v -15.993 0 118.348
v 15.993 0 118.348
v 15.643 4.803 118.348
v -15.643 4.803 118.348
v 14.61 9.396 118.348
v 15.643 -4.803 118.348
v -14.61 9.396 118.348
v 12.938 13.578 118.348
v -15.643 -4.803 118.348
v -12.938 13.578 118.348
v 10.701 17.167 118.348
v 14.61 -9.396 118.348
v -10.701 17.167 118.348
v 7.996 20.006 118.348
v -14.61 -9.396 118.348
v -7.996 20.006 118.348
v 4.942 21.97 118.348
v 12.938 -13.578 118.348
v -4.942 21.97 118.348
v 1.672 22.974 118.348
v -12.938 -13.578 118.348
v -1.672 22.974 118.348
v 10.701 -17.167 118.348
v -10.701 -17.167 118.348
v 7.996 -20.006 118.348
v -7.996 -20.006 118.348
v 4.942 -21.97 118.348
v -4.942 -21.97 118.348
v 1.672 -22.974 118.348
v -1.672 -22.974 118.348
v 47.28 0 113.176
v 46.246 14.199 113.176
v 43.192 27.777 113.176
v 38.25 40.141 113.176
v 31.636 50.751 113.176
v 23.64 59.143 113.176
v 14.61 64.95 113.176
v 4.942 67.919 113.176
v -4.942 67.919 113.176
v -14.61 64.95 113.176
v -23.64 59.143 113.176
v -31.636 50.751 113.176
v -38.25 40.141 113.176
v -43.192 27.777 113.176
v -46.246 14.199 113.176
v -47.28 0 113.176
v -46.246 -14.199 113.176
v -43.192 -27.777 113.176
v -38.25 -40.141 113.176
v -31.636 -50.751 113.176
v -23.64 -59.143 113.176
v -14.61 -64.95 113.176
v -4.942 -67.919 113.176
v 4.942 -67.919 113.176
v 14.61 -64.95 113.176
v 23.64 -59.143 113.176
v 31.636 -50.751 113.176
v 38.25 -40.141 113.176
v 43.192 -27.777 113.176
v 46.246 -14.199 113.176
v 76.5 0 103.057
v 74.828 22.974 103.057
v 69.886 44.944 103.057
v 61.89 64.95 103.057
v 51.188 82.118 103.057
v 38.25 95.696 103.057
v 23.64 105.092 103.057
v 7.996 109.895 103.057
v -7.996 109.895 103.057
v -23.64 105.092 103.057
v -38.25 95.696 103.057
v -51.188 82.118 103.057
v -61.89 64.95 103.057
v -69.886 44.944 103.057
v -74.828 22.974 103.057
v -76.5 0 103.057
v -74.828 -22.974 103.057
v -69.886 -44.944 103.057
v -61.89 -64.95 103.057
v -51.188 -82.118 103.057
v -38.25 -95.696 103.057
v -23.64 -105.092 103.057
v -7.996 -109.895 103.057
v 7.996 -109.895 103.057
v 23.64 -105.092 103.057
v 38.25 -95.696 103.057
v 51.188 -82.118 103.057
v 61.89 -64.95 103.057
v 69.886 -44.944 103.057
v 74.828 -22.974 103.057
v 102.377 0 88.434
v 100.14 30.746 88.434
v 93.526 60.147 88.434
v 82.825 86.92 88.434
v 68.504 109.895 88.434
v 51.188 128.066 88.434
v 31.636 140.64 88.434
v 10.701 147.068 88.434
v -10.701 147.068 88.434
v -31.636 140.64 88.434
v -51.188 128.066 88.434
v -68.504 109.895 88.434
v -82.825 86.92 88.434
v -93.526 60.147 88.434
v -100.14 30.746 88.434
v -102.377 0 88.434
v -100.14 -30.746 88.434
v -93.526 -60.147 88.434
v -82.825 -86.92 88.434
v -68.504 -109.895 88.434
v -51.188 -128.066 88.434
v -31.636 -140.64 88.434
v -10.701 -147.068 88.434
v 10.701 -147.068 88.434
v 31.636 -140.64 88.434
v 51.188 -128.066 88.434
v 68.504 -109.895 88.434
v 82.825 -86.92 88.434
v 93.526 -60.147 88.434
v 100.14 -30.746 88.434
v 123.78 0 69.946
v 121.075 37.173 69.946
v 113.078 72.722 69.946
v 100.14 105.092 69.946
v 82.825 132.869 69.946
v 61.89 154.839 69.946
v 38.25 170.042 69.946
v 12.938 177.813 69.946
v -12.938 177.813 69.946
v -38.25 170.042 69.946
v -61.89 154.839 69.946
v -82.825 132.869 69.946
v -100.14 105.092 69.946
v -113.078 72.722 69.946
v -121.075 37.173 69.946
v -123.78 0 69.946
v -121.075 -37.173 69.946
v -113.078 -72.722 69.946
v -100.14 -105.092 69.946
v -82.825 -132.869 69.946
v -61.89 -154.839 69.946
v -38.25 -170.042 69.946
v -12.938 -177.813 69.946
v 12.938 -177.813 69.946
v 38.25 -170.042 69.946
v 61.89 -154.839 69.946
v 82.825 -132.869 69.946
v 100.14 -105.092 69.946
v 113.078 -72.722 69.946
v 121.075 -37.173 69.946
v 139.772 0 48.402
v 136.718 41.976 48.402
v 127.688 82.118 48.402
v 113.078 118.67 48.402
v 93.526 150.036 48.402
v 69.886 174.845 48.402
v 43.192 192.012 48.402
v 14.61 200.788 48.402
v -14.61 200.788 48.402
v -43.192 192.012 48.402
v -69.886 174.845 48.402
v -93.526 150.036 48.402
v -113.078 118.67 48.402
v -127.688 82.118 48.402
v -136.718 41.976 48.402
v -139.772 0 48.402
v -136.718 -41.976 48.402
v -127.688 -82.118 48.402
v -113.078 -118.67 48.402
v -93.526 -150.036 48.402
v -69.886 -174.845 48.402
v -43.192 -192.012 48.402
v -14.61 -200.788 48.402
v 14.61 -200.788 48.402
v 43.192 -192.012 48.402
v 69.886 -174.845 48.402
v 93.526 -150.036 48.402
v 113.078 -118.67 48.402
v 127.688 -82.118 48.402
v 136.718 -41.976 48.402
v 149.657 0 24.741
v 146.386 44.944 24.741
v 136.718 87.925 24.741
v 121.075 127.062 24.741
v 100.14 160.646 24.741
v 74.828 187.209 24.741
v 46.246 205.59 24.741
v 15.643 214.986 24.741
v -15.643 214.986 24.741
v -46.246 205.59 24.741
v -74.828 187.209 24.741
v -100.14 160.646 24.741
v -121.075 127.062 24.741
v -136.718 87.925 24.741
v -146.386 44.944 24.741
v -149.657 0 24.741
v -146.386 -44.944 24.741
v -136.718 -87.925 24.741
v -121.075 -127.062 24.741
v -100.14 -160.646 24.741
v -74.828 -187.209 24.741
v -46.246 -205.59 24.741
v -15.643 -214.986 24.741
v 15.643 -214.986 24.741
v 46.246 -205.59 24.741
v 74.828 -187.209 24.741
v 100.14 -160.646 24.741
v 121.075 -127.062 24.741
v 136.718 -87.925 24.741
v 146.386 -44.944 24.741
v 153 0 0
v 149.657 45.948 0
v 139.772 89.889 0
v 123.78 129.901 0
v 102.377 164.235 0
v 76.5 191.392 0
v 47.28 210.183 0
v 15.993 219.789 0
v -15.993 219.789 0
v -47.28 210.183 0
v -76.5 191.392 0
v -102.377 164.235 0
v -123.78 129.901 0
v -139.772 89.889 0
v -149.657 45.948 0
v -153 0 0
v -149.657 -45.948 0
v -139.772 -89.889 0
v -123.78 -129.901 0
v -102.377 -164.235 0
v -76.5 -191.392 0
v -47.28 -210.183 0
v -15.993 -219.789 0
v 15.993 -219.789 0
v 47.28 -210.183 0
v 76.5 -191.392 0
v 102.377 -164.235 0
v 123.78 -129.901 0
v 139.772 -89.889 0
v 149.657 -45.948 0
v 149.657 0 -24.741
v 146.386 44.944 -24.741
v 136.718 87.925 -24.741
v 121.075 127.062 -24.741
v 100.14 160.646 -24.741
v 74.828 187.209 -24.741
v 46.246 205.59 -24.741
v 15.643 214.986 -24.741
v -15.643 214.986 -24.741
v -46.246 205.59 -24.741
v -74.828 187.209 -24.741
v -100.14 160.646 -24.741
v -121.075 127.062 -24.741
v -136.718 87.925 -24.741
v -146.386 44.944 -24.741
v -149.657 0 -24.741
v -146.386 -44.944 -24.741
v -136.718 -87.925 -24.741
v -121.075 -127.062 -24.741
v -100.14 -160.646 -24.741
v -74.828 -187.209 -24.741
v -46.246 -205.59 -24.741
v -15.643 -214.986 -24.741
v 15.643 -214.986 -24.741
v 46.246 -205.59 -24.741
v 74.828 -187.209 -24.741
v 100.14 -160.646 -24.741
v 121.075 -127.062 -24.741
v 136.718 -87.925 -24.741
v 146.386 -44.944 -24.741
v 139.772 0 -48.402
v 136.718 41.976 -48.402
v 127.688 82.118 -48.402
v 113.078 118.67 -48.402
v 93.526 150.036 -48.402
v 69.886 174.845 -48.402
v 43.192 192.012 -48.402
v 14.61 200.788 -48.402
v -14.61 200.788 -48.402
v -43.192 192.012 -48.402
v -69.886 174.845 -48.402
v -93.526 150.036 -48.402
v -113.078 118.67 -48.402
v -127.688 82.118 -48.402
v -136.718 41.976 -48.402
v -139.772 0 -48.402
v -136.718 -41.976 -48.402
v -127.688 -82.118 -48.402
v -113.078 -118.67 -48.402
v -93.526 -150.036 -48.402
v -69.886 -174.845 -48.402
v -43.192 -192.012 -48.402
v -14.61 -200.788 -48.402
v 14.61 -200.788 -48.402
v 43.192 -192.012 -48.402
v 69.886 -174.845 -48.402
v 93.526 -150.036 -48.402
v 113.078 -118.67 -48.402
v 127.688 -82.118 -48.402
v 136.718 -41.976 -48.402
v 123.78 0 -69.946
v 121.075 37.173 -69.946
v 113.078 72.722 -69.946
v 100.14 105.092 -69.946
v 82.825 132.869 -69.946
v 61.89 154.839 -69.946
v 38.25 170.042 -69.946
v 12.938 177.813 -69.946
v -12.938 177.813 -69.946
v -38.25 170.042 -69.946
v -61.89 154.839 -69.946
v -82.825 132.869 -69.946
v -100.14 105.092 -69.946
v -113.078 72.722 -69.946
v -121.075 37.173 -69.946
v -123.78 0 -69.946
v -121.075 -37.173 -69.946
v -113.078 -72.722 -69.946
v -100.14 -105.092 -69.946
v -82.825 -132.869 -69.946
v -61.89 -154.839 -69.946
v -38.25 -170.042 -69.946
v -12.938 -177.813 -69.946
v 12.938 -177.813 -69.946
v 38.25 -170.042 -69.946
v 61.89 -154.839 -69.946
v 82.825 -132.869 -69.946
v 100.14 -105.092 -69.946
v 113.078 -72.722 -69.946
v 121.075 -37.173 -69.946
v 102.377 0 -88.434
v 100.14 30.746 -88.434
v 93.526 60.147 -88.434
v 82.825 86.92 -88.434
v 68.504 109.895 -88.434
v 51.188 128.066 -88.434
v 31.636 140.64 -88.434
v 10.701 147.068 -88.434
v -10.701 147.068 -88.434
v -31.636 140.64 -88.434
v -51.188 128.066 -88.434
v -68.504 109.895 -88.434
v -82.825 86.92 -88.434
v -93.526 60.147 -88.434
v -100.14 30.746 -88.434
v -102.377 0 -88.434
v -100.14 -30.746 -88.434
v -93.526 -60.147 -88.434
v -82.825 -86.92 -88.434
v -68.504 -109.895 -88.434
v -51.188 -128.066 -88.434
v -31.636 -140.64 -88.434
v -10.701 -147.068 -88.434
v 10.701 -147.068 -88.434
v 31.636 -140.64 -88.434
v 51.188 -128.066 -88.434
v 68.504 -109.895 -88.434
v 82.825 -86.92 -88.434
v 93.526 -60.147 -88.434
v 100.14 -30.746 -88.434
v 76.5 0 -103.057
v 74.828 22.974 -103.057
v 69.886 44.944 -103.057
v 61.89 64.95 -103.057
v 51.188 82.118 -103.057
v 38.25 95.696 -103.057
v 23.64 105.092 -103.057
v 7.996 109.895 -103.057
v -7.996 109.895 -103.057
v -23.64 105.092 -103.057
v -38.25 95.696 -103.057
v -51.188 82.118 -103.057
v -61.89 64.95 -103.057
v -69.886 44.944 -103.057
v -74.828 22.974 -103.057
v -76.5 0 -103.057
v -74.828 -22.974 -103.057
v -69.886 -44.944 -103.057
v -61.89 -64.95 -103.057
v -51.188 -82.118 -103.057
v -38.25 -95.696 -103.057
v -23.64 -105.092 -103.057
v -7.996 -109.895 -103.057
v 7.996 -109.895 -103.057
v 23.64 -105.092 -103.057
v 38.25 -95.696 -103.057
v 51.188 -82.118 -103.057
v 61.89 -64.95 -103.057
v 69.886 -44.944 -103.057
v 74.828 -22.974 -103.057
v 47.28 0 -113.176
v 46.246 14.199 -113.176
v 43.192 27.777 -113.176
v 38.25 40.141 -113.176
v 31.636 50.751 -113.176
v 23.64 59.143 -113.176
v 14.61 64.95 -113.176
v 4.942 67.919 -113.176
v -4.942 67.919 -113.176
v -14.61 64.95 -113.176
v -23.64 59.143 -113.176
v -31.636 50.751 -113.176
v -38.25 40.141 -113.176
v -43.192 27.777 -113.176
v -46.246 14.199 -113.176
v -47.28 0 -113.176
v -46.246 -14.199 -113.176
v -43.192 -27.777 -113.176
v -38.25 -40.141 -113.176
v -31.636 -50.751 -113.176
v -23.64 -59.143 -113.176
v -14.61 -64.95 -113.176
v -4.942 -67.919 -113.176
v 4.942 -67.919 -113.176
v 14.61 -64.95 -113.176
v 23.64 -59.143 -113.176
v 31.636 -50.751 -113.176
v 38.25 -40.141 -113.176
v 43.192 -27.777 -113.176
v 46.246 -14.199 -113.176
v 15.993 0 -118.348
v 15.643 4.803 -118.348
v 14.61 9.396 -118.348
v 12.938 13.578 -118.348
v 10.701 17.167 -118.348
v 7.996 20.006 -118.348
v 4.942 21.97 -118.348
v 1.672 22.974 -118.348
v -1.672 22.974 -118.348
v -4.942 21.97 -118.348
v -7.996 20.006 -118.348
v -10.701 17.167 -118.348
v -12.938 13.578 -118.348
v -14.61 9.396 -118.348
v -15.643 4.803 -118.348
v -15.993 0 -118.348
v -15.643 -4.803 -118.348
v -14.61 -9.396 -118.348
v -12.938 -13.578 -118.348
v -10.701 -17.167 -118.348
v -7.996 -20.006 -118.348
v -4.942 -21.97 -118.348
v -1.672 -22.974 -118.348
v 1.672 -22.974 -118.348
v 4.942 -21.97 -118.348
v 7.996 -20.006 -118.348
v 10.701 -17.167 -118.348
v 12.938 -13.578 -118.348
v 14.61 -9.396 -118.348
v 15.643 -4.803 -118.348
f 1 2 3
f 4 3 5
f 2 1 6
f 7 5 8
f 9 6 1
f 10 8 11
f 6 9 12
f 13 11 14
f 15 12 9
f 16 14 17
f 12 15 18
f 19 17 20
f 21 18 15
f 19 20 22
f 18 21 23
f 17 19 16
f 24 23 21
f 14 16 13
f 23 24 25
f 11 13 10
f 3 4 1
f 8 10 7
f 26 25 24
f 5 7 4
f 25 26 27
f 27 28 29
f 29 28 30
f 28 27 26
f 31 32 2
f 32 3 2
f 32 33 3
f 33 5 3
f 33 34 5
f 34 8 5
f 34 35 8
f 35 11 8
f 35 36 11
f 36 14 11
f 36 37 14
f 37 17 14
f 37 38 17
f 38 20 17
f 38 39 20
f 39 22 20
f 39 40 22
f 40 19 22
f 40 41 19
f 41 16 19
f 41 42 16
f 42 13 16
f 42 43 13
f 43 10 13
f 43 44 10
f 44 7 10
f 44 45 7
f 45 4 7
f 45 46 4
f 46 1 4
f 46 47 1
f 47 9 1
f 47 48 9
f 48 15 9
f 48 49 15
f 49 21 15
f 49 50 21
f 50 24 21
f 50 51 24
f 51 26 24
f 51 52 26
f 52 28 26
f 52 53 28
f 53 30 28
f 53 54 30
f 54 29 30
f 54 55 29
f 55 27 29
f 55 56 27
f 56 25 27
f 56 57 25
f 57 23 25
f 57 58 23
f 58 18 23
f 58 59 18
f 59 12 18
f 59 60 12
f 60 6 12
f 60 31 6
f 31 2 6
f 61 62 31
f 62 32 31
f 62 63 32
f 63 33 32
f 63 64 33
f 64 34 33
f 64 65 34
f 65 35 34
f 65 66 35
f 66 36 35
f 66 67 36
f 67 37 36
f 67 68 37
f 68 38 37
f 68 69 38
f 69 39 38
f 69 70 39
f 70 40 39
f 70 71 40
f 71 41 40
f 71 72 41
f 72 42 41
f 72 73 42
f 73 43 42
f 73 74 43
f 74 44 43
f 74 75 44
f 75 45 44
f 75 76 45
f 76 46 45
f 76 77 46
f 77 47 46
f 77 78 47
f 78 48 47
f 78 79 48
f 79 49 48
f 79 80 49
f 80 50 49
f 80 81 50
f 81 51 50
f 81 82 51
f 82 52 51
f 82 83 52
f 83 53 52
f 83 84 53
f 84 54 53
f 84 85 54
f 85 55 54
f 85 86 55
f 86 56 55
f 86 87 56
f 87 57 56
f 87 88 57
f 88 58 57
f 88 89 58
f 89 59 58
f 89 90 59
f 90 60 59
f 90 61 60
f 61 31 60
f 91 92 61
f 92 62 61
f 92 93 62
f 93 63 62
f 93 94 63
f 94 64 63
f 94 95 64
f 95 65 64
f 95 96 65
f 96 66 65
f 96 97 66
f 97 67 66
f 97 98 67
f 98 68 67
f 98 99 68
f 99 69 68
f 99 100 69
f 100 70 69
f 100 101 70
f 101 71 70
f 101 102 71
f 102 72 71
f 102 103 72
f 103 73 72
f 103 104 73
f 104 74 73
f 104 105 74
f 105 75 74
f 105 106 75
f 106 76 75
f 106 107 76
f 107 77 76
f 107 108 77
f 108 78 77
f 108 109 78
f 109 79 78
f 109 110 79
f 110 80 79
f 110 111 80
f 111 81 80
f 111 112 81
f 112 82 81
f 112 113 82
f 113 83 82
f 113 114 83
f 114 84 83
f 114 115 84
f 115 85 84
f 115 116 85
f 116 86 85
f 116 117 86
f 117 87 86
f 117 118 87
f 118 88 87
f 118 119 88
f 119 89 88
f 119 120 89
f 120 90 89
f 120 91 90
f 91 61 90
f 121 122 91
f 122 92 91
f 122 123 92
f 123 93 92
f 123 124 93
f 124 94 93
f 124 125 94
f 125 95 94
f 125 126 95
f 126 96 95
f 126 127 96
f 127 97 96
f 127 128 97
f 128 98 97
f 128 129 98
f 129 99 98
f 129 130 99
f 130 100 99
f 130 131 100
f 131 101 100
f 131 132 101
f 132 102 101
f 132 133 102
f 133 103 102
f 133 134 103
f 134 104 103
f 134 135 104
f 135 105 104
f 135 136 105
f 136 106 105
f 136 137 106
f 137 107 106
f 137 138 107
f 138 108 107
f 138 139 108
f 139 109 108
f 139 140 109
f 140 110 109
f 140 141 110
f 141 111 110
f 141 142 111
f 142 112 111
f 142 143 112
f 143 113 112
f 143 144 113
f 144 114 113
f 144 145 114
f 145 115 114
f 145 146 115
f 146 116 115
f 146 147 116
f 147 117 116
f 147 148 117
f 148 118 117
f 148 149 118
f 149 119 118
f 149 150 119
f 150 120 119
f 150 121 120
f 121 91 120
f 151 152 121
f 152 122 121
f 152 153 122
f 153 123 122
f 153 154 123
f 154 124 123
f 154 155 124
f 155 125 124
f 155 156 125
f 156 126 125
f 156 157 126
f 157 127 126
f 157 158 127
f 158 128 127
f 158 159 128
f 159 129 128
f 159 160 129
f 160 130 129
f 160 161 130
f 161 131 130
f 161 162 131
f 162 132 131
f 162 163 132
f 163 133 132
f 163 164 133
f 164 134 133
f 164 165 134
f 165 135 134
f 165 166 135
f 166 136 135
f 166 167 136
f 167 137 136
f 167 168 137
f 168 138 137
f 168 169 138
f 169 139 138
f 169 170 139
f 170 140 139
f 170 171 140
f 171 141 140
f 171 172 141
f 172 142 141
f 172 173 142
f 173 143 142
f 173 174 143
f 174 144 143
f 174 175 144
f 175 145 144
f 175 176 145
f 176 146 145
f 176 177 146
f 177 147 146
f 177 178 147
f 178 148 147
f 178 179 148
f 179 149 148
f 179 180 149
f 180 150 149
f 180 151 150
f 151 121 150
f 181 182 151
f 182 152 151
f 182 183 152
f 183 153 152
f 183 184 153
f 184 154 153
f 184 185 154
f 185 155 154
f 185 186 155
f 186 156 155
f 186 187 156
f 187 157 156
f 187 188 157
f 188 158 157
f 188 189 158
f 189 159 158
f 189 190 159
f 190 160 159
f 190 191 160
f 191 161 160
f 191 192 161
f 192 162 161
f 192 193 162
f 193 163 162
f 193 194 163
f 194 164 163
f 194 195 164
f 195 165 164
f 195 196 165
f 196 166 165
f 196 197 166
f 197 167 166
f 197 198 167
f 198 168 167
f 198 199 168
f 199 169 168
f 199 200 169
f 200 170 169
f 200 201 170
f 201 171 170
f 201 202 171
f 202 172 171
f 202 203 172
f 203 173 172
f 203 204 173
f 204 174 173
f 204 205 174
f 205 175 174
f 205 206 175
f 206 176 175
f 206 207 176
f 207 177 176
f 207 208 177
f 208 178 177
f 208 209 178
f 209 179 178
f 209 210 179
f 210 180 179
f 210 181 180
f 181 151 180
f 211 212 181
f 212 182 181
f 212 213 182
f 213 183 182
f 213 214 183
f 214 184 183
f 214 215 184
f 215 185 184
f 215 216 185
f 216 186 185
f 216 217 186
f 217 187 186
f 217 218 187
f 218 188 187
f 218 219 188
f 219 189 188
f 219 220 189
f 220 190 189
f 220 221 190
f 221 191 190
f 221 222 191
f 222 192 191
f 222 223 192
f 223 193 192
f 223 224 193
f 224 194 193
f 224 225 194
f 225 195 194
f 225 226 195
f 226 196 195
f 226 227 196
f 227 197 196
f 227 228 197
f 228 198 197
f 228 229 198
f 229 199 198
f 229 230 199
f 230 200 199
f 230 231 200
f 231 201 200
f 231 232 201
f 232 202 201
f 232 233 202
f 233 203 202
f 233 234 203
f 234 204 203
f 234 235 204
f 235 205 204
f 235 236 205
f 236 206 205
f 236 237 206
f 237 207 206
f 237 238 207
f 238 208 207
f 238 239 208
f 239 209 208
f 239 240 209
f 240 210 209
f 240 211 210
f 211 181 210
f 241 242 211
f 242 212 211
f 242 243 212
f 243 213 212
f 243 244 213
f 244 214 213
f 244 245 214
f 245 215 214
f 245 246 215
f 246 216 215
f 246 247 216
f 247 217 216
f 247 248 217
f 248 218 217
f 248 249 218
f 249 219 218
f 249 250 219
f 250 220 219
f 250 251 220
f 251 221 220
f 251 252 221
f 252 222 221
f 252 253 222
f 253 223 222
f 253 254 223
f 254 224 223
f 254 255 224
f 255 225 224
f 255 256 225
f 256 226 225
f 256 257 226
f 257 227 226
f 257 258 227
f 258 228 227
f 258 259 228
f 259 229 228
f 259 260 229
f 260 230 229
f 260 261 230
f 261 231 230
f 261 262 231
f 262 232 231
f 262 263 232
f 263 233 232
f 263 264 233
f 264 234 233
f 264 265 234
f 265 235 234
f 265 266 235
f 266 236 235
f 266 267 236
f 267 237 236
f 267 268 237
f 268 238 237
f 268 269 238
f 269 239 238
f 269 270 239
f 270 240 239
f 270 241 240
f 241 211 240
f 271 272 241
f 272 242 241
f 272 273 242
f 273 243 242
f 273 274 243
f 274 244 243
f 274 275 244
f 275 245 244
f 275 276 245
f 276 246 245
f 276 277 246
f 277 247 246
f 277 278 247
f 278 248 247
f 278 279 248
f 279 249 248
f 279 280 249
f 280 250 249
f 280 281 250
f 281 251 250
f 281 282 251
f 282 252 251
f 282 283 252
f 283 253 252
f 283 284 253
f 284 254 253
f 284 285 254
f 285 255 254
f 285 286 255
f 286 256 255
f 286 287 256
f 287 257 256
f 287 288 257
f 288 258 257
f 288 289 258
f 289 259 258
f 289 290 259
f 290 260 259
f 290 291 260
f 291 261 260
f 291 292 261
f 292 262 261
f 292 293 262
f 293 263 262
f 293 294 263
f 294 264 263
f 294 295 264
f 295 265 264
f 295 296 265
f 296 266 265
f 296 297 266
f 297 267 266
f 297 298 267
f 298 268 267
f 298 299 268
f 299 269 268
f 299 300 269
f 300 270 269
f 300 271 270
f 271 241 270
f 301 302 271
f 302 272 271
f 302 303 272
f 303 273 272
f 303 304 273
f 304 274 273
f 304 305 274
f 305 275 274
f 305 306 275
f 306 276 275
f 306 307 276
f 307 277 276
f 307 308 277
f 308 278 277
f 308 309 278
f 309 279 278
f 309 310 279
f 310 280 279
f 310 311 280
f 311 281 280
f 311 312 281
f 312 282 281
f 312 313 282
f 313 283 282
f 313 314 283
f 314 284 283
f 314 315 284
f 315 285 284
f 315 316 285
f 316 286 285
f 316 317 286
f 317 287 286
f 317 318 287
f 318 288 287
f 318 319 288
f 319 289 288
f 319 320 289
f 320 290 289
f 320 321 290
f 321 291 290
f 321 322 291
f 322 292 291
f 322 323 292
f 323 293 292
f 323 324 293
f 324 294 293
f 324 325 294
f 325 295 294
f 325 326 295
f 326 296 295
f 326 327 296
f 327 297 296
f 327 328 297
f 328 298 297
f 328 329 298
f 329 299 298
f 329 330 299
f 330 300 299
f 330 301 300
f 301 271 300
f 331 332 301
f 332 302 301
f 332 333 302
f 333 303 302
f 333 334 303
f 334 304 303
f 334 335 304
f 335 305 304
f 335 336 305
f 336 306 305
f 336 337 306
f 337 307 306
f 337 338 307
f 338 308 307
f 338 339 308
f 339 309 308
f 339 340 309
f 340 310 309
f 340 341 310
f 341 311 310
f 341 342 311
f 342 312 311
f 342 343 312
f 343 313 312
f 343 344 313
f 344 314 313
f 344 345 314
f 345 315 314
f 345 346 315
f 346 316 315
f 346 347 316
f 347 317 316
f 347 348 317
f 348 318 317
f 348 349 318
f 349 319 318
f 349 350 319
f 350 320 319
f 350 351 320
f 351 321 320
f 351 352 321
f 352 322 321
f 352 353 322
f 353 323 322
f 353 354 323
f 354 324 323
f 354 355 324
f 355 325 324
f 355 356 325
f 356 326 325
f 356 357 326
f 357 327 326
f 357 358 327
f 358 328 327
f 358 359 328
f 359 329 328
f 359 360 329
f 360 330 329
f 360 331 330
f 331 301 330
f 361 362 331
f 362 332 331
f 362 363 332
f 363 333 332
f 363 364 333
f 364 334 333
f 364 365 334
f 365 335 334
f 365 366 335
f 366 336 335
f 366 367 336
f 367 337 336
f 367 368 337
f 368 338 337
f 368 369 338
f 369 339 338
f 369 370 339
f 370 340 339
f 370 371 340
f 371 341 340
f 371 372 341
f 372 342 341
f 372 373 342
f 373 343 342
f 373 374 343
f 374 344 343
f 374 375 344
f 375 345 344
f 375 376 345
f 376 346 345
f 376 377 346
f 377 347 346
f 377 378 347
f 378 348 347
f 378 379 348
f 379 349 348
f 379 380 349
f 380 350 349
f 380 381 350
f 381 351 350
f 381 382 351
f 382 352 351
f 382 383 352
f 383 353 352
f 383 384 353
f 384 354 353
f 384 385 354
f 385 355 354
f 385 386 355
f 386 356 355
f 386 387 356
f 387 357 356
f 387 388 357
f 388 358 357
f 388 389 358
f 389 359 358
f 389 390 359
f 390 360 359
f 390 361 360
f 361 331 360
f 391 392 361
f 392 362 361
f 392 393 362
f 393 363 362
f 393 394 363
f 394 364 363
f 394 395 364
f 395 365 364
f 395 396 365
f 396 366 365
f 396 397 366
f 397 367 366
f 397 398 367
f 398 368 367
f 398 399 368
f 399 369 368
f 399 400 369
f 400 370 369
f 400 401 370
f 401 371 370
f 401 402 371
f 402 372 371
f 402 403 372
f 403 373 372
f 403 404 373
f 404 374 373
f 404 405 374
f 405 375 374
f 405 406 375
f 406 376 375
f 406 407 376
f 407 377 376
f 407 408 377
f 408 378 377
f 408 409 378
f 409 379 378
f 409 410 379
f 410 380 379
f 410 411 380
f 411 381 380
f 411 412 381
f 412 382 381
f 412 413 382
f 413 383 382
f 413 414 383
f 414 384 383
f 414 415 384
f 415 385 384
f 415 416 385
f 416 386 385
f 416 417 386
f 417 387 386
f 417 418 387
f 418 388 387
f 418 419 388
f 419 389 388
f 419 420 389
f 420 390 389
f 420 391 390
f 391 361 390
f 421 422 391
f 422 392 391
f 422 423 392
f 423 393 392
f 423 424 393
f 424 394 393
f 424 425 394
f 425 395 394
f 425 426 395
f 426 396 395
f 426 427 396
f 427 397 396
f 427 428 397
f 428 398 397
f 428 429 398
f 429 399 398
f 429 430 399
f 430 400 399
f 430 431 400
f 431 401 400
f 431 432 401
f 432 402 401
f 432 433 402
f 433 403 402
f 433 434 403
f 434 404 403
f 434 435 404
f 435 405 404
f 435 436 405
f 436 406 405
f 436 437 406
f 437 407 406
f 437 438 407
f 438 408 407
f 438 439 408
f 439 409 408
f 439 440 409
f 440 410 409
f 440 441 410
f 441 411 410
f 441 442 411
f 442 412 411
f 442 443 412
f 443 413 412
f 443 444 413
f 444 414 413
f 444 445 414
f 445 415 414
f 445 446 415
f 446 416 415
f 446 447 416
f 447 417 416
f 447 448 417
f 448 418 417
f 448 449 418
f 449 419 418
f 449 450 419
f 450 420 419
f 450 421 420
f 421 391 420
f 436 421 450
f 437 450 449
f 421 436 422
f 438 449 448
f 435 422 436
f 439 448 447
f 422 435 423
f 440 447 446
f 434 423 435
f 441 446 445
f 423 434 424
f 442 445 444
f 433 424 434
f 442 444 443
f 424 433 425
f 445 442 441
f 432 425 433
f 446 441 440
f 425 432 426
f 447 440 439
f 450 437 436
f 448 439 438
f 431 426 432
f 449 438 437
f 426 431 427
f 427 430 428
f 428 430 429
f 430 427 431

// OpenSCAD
// Generated by SolidPython 1.0.1 on 2020-07-29 00:46:48


scale(v = [9, 13, 7]) {
	sphere(r = 17);
}
/***********************************************
*********      SolidPython code:      **********
************************************************
 
# import packages: SolidPython
from solid import *
from solid.utils import *
from itertools import chain, combinations, permutations


class Resize:

    def __init__(self, scad_file):
        self.scad_file = scad_file
        #self.scad_file = import_scad(scad_file)
        # cone/cylinder param:
        self.r1 = 0
        self.r2 = 0
        self.h = 0
        # rectangular prism param:
        self.w = 0
        self.l = 0
        # ellipse param:
        self.r = 0

    # import OpenScad code (file name corresponds to shape)


    # classify shape + parameters
    def assign(self, param1, param2, param3):
        if self.scad_file == 'cone.scad':
            self.r1 = param1
            self.r2 = param2
            self.h = param3
        elif self.scad_file == 'cylinder.scad':
            self.r1 = param1
            self.r2 = param2
            self.h = param3
        elif self.scad_file == 'rectangularPrism.scad':
            self.h = param1
            self.l = param2
            self.w = param3
        else:
            self.r = param1
            self.h = param2

    # resize parameters
    def iterate(self):
        x = range(3, 20, 2)
        i = 1
        if self.scad_file == 'cone.scad':
            tempList = list(permutations(x, 2))
            for temp in tempList:
                param1 = temp[0]
                param2 = temp[1]
                filepath = 'produced_scad_files/' + 'cone' + str(param1) + '_' + str(param2) + '_' + '.scad'
                scad_render_to_file(cylinder(h=param1, r1=param2, r2=0), filepath)

        elif self.scad_file == 'cylinder.scad':
            tempList = list(permutations(x, 3))
            for temp in tempList:
                param1 = temp[0]
                param2 = temp[1]
                filepath = 'produced_scad_files/' + 'cylinder' + str(param1) + '_' + str(param2) + '_' + '.scad'
                scad_render_to_file(cylinder(h=param1, r1=param2, r2=param2), filepath)

        elif self.scad_file == 'rectangularPrism.scad':
            tempList = list(permutations(x, 3))
            for temp in tempList:
                param1 = temp[0]
                param2 = temp[1]
                param3 = temp[2]
                filepath = 'produced_scad_files/' + 'rectangularPrism' + str(param1) + '_' + str(param2) + '_' + str(
                    param3) + '.scad'
                scad_render_to_file(cube(size=(param1, param2, param3)), filepath)

        elif self.scad_file == 'ellipse.scad':
            tempList = list(permutations(x, 4))
            for temp in tempList:
                param1 = temp[0]
                param2 = temp[1]
                param3 = temp[2]
                param4 = temp[3]
                filepath = 'produced_scad_files/' + 'ellipse' + str(param1) + '_' + str(param2) + '_' + str(param3) + '_' + str(param4) + '.scad'
                scad_render_to_file(scale([param1, param2, param3])(sphere(r=param4)), filepath)

    def render_to_scadfile(self):
        scad_render_to_file(scad, 'example.scad') 
 
************************************************/
